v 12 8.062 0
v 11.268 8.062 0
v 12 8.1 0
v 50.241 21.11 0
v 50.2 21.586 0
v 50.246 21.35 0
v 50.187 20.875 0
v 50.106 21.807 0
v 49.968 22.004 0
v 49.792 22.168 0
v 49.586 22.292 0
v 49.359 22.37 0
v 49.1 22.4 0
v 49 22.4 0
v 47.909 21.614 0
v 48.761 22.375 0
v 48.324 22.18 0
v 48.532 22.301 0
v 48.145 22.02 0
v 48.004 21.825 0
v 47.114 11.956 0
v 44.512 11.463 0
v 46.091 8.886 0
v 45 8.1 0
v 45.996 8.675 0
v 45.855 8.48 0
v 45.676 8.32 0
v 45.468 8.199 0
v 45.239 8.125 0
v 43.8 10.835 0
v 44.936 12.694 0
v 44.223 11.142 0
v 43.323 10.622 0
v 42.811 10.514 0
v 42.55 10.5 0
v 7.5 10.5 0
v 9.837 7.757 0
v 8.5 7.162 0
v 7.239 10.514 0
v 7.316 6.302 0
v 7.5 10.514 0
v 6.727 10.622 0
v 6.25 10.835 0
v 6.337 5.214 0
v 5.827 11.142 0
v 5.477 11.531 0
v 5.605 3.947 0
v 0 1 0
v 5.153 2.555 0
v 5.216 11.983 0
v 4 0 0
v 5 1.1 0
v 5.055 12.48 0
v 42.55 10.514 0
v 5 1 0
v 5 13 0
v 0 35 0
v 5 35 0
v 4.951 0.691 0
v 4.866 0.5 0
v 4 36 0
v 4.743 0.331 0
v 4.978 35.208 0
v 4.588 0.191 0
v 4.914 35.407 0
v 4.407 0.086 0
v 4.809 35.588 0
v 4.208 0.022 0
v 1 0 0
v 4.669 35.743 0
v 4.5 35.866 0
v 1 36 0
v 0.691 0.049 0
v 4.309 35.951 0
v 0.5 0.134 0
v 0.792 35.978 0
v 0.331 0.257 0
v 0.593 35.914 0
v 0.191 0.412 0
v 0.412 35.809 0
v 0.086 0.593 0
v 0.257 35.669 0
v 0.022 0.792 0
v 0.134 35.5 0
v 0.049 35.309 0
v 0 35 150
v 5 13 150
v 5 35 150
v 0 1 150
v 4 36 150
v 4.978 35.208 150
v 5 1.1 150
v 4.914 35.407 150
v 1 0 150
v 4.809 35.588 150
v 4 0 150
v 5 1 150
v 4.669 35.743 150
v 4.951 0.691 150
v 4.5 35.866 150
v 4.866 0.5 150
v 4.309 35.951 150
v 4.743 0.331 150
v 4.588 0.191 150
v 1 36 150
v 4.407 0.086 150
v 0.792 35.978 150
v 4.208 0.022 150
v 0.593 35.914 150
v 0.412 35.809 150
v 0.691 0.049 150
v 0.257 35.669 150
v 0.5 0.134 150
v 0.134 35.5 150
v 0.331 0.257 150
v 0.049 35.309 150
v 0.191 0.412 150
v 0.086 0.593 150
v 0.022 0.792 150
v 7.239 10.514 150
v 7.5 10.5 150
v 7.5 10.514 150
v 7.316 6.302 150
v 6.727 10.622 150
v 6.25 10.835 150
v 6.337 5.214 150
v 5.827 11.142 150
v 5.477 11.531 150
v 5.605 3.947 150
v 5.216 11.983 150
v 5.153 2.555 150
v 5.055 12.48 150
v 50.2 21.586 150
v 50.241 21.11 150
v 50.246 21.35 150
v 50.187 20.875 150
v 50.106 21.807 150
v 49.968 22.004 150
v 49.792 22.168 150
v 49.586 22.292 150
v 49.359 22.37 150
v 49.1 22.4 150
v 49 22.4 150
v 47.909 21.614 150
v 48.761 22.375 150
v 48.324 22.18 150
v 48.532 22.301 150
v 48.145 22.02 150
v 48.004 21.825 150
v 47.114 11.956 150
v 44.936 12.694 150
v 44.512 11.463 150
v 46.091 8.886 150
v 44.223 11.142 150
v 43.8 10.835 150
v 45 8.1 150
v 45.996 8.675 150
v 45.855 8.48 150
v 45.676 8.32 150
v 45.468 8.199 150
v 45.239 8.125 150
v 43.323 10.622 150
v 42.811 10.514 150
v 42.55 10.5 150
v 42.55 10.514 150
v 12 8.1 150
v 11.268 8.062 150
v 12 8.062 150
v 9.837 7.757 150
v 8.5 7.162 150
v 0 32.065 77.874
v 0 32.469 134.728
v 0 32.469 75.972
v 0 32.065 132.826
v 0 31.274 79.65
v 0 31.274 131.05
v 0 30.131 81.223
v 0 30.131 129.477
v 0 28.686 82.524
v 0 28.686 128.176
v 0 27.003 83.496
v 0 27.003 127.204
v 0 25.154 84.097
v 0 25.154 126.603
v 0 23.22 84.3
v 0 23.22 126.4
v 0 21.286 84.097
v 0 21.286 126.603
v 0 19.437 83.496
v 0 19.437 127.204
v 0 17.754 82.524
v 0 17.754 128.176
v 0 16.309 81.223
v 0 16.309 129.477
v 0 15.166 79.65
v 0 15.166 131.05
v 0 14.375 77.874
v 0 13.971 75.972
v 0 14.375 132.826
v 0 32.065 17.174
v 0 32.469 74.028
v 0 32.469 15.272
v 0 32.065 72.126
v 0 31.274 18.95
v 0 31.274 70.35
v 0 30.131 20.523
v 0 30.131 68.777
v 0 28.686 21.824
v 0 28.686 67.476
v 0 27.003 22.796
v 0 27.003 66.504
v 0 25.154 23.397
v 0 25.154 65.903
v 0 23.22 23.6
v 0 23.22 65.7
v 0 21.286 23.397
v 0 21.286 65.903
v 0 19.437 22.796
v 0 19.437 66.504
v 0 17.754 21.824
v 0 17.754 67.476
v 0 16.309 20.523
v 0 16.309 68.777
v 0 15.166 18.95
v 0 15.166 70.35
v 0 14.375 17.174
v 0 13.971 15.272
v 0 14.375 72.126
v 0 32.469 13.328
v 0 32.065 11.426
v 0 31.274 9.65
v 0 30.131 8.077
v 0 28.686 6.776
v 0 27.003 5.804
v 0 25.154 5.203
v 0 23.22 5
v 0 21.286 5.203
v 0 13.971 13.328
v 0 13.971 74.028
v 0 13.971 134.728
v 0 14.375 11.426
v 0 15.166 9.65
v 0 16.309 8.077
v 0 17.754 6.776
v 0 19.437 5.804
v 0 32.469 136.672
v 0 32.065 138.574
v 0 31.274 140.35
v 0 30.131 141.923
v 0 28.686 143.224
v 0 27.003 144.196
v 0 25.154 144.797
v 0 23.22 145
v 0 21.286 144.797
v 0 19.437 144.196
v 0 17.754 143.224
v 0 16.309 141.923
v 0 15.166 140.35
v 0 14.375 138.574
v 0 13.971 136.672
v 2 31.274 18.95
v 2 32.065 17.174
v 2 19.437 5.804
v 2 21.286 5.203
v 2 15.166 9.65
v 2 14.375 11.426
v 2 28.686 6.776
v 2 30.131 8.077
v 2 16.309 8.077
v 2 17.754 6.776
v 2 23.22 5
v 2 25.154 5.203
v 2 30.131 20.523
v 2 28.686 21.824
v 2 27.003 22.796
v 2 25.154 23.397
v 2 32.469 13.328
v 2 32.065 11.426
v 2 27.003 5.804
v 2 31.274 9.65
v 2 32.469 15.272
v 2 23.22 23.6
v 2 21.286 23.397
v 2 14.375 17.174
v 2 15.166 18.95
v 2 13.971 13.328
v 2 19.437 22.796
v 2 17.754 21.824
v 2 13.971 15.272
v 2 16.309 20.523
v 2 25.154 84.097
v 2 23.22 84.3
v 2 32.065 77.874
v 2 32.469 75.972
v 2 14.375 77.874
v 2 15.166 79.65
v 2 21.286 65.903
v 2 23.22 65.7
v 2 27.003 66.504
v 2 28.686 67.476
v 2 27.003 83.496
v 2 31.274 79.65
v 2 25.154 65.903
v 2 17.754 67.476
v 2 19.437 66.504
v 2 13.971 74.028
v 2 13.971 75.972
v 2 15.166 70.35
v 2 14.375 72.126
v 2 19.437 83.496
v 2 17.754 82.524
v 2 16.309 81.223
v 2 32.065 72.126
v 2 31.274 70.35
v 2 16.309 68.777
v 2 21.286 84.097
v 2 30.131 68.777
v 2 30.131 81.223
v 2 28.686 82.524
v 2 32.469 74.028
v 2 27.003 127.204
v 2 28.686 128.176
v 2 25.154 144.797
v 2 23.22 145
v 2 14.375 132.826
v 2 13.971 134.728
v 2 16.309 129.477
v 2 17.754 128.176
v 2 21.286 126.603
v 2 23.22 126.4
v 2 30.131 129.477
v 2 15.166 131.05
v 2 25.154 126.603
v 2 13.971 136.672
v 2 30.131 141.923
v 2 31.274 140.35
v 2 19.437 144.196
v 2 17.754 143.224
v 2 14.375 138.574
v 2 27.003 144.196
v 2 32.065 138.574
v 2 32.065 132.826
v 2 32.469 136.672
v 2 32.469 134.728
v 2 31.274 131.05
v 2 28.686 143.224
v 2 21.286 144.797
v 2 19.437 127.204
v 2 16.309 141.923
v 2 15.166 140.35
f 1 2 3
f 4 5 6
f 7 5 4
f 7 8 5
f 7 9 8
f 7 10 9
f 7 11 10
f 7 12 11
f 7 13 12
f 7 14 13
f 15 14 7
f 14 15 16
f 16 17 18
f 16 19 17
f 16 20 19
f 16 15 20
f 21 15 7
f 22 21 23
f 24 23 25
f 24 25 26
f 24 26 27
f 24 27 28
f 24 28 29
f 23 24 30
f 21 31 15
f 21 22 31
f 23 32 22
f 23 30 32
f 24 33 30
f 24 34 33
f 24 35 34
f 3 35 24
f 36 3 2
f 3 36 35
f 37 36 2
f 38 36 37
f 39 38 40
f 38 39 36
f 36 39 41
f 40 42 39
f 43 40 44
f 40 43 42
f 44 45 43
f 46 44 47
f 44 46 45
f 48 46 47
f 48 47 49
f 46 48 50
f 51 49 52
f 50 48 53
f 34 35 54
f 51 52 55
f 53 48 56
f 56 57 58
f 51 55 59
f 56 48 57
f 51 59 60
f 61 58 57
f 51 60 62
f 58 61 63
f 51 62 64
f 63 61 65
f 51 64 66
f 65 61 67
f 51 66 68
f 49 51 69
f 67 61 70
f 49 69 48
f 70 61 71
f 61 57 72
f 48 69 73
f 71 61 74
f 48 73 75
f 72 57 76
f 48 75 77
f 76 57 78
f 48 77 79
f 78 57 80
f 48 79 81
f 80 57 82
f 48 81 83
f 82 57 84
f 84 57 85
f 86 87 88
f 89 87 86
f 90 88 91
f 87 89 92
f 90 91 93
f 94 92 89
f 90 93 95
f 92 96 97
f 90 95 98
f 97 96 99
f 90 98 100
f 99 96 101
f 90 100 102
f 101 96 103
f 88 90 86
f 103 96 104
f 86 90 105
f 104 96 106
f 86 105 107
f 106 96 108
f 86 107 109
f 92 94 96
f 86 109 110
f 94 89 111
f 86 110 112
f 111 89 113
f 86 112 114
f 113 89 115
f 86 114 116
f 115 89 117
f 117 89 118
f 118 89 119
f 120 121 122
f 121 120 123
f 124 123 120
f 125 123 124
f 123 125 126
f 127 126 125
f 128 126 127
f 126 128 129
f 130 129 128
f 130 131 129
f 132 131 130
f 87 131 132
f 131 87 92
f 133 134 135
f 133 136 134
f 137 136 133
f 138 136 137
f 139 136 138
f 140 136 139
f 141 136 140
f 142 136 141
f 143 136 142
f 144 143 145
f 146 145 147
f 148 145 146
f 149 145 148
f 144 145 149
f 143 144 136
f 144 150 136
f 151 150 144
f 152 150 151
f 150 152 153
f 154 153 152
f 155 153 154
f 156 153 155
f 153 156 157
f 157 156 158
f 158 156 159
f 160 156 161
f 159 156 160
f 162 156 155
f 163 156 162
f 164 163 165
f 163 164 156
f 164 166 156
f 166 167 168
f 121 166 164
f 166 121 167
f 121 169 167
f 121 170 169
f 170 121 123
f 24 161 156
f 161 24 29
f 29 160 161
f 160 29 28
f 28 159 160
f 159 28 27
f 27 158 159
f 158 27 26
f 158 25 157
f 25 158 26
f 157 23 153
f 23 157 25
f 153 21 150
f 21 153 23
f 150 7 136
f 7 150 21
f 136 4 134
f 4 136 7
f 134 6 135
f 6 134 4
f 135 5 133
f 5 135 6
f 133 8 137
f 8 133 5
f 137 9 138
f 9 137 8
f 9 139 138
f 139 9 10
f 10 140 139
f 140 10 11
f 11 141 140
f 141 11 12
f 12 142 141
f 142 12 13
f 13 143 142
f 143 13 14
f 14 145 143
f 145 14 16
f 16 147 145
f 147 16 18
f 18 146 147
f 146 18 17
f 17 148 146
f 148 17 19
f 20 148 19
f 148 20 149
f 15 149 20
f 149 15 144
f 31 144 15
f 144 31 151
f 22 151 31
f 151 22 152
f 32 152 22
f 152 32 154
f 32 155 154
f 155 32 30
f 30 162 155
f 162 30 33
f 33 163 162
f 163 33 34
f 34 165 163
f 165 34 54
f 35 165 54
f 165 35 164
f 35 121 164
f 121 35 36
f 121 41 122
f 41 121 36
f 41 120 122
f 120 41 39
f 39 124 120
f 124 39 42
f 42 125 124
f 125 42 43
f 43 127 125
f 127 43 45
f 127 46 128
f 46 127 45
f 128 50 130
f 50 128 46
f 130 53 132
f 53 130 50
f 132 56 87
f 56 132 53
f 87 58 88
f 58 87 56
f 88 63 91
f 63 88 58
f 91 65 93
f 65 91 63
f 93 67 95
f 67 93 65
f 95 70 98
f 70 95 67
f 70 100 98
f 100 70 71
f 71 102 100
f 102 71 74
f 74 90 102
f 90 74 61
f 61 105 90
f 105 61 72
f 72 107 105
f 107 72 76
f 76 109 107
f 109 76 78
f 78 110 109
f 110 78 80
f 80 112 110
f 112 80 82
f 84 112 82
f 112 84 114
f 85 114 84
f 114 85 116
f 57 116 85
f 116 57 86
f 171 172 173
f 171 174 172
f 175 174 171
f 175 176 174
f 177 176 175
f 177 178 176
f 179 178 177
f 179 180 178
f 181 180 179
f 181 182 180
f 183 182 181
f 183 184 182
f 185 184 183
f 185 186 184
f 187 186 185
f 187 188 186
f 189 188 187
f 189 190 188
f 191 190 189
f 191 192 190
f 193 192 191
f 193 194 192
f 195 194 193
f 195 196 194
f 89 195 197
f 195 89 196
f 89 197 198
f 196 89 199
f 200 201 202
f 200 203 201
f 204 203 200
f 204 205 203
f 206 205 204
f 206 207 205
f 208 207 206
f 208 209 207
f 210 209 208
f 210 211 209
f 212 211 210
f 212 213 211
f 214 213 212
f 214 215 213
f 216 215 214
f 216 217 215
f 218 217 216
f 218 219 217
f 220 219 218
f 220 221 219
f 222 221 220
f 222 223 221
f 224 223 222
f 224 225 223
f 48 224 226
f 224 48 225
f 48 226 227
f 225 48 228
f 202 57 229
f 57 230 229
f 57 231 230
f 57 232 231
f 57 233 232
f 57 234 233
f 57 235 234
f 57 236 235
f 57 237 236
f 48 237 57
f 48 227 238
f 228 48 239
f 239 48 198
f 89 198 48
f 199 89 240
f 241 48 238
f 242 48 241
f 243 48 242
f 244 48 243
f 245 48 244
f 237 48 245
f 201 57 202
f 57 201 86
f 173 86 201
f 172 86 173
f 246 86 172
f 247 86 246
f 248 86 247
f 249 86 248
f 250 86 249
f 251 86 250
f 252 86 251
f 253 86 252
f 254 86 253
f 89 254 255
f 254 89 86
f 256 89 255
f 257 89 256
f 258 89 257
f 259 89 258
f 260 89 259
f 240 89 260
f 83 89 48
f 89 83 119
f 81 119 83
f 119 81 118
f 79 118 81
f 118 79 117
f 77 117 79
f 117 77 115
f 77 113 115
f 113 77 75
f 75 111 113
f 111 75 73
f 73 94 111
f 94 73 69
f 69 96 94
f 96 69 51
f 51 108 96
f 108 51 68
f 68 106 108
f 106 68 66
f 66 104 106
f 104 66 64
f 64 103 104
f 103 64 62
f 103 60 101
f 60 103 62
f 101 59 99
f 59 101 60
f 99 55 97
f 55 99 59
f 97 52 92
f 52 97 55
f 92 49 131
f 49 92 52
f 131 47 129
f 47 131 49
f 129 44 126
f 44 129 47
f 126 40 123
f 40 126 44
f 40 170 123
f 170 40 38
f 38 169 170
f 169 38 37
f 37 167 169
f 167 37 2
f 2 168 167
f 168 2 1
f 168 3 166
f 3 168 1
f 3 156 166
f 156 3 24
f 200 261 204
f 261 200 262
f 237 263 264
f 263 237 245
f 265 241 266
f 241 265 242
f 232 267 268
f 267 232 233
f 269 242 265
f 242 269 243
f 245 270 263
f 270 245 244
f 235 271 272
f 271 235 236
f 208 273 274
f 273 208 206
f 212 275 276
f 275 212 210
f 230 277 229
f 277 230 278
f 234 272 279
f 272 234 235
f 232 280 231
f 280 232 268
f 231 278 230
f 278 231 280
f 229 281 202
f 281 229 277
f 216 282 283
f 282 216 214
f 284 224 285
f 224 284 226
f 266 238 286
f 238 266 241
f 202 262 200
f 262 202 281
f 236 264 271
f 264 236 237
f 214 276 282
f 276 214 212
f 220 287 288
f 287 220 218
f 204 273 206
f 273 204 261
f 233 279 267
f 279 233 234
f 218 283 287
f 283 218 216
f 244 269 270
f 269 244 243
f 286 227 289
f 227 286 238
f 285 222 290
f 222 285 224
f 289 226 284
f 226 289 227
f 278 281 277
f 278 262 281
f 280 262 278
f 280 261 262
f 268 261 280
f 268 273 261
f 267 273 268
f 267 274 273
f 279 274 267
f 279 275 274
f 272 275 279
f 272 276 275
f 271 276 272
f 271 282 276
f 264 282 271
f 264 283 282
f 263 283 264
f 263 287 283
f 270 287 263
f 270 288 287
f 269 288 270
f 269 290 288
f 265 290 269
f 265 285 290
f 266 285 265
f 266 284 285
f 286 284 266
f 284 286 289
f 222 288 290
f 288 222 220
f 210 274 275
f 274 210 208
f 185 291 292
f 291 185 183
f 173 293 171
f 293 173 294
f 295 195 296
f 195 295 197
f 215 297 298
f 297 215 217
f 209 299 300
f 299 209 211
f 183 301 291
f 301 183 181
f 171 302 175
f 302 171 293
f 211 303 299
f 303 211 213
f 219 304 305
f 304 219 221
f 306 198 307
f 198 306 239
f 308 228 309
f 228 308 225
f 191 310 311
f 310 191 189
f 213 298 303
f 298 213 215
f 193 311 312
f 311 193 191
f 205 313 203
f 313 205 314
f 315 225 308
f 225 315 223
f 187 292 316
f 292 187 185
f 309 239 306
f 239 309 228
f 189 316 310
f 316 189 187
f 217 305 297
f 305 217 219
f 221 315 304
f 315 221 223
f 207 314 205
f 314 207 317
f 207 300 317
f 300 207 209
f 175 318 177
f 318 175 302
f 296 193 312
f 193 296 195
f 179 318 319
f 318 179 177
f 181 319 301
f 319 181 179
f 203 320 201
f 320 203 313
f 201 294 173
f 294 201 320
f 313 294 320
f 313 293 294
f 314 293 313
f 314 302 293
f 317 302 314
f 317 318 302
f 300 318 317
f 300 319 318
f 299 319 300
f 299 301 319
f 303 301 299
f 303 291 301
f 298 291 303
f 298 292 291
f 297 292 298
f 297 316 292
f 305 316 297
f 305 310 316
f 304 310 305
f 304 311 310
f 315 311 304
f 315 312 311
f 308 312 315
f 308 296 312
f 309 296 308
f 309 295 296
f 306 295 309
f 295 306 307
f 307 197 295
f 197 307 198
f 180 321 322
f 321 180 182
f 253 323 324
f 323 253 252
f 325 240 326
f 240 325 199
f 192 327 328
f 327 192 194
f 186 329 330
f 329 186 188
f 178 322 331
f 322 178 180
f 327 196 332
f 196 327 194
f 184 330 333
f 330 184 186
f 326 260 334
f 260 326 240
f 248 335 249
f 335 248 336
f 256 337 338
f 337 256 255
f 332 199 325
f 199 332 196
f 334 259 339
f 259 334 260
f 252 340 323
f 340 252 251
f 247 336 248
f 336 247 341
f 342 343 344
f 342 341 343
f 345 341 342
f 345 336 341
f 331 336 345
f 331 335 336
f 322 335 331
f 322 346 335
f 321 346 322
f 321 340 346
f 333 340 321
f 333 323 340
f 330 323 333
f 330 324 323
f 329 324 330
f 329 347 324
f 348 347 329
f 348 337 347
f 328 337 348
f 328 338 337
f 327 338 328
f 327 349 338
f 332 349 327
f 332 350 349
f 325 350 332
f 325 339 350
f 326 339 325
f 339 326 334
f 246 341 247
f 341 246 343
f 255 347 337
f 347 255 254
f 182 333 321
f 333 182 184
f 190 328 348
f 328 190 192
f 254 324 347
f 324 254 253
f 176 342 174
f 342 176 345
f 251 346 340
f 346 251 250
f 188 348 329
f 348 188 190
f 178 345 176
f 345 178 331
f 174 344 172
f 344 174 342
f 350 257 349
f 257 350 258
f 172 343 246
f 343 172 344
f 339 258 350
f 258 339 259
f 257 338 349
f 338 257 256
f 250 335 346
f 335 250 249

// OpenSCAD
// preview[view:north, tilt:top diagonal]

//tray thickness (in mm)
thickness = 2.5;

//tray width (in cm)
width = 15;

//tray depth (in cm)
depth = 4;

//magnets diameter (in mm)
magnet_diameter = 18.6;

//magnets thickness (in mm)
magnet_thickness = 2;

sth = thickness;

sw = width*10;   // support width
sd = depth*10;   // support depth

seh = 12*1;   // support edge height
sei = 1/3;  // support edge incline

msh = 36/40*sd;   // magnet support height
msd = 5*1;    // magnet support depth


mr = magnet_diameter/2;   // magnets radius
md = 2*1;     // magnets depth (ie thickness)

cr = 1*1;     // chamfer radius
$fn = 30*1;

// other calculated values (magnets position)
vpos = (msh-seh)*1/3;
mpos = (msh-mr*2)*4/5;


// object
difference() {
    translate(v = [msd, 0, 0])
    linear_extrude(height = sw) {
      magnet_support();
      pen_support();
    }
    translate(v = [0, 0, mr+5]) magnet();
    translate(v = [0, 0, sw/2]) magnet();
    translate(v = [0, 0, sw-mr-5]) magnet();
}

module magnet() {
    translate(v = [-md, mr+mpos, 0])
    rotate([0, 90, 0])
    cylinder(r=mr, h=md*2);
}

module magnet_support() {
    translate(v = [cr-msd, cr, 0])
    offset(chamfer = true, r = cr)
    square(size = [msd-2*cr, msh-2*cr]);
}

module pen_support() {
    translate(v = [0, vpos+sth/2, 0])
    offset(chamfer = true, r = sth/2-0.1)
    polygon(points = [
          [0, 0],
          [sd, 0],
          [sd+seh*sei, seh],
          [0.1+sd+seh*sei, seh],
          [sd, 0.1],
          [0, 0.1]
        ]
      );
    translate(v = [0, cr+0.1, 0])
    difference() {
      square(size = [vpos-cr, vpos-cr]);
      translate(v = [vpos-cr, 0, 0]) circle(r=vpos-cr);
    }
    translate(v = [0, vpos+sth, 0])
    difference() {
      square(size = [sth, sth]);
      translate(v = [sth, sth, 0]) circle(r=sth);
    }
    translate(v = [sd-sth+0.05, vpos+sth, 0])
    difference() {
      square(size = [sth*1.2, sth]);
      translate(v = [0, sth, 0]) circle(r=sth);
    }
}
